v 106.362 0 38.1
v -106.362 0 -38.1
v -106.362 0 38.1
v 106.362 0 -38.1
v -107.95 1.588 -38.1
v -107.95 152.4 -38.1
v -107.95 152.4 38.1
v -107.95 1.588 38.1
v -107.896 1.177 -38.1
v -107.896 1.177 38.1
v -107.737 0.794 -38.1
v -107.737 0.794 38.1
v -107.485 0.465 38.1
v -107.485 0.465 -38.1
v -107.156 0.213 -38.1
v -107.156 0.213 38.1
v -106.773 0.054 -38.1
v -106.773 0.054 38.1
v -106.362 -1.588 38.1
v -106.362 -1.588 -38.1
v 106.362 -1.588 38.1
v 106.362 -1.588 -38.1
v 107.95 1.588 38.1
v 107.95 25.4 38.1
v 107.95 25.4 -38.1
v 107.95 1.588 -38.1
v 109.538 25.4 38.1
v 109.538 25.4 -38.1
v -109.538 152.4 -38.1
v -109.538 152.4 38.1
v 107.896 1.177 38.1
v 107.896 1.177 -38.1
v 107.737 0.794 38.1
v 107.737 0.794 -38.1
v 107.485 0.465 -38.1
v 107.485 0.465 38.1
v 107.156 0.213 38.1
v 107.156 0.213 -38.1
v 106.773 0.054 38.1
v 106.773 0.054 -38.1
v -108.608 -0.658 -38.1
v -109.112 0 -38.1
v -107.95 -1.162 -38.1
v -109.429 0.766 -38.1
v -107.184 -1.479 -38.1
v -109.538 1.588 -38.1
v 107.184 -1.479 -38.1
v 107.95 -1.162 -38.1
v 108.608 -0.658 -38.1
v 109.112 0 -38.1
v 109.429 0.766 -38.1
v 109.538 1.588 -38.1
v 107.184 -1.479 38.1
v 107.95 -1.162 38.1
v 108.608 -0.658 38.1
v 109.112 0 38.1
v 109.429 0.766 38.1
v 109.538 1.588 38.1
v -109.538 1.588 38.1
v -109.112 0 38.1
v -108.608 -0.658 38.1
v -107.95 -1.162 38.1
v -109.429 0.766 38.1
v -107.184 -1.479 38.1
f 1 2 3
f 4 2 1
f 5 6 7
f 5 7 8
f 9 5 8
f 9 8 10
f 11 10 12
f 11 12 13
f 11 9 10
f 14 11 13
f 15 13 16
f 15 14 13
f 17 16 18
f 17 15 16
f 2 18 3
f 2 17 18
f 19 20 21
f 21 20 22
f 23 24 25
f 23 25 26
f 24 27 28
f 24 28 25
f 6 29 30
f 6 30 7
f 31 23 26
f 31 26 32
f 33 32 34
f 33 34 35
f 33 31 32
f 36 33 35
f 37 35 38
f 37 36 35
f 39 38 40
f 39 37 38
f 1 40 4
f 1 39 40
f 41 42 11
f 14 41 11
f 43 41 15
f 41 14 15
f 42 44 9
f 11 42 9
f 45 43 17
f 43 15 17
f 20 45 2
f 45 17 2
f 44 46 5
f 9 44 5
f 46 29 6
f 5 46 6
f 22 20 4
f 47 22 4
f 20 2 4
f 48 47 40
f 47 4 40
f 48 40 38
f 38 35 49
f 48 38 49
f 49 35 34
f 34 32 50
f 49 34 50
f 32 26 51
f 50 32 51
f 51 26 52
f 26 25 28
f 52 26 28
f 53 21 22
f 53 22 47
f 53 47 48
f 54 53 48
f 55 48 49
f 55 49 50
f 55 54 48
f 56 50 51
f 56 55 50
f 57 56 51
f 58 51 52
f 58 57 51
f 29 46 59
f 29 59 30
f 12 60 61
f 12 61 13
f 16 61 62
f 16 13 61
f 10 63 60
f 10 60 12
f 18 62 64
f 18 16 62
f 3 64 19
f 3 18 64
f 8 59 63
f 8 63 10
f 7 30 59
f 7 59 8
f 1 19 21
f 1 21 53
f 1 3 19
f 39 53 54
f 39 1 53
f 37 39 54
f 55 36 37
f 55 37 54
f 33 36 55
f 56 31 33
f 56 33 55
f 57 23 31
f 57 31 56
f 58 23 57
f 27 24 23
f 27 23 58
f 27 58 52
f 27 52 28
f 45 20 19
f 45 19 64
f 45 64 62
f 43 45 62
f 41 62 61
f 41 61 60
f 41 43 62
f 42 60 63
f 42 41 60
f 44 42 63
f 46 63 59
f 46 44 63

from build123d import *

# Parameters (mm, degrees)
SKETCH1_W                    = 215.9
SKETCH1_H                    = 76.2
BASE_FLANGE1_DEPTH           = 1.5875
EDGE_FLANGE1_STRIP_W         = 9.525
EDGE_FLANGE1_STRIP_H         = 1.5875
EDGE_FLANGE1_STRIP_CUT_DEPTH = 76.2
EDGE_FLANGE1_DEPTH           = 76.2
EDGE_FLANGE3_STRIP_W         = 9.525
EDGE_FLANGE3_STRIP_H         = 1.5875
EDGE_FLANGE3_STRIP_CUT_DEPTH = 76.2
EDGE_FLANGE3_DEPTH           = 76.2


# Sheet-metal steps are written as plain solids
with BuildPart() as part:
    # Sketch1 → Base-Flange1 (new body)
    with BuildSketch(Plane(origin=(0, 0, 0), x_dir=(1, 0, 0), z_dir=(0, 1, 0))):
        Rectangle(SKETCH1_W, SKETCH1_H)
    extrude(amount=-BASE_FLANGE1_DEPTH)

    # Edge-Flange1 strip (across the edge) → Edge-Flange1 strip cut (cut)
    with BuildSketch(Plane(origin=(-107.95, 0, -38.1), x_dir=(1, 0, 0), z_dir=(0, 0, 1))):
        with Locations((-3.175, -0.79375)):
            Rectangle(EDGE_FLANGE1_STRIP_W, EDGE_FLANGE1_STRIP_H)
    extrude(amount=EDGE_FLANGE1_STRIP_CUT_DEPTH, mode=Mode.SUBTRACT)

    # Edge-Flange1 section (across the edge) → Edge-Flange1 (add)
    with BuildSketch(Plane(origin=(-107.95, 0, -38.1), x_dir=(1, 0, 0), z_dir=(0, 0, 1))):
        with BuildLine():
            Line((-1.5875, 1.5875), (-1.5875, 152.4))
            Line((-1.5875, 152.4), (0, 152.4))
            Line((0, 152.4), (0, 1.5875))
            ThreePointArc((0, 1.5875), (0.464967985, 0.464967985), (1.5875, 0))
            Line((1.5875, 0), (1.5875, -1.5875))
            ThreePointArc((1.5875, -1.5875), (-0.65756403, -0.65756403), (-1.5875, 1.5875))
        make_face()
    extrude(amount=EDGE_FLANGE1_DEPTH)

    # Edge-Flange3 strip (across the edge) → Edge-Flange3 strip cut (cut)
    with BuildSketch(Plane(origin=(107.95, 0, 38.1), x_dir=(-1, 0, 0), z_dir=(0, 0, -1))):
        with Locations((-3.175, -0.79375)):
            Rectangle(EDGE_FLANGE3_STRIP_W, EDGE_FLANGE3_STRIP_H)
    extrude(amount=EDGE_FLANGE3_STRIP_CUT_DEPTH, mode=Mode.SUBTRACT)

    # Edge-Flange3 section (across the edge) → Edge-Flange3 (add)
    with BuildSketch(Plane(origin=(107.95, 0, 38.1), x_dir=(-1, 0, 0), z_dir=(0, 0, -1))):
        with BuildLine():
            Line((-1.5875, 1.5875), (-1.5875, 25.4))
            Line((-1.5875, 25.4), (0, 25.4))
            Line((0, 25.4), (0, 1.5875))
            ThreePointArc((0, 1.5875), (0.464967985, 0.464967985), (1.5875, 0))
            Line((1.5875, 0), (1.5875, -1.5875))
            ThreePointArc((1.5875, -1.5875), (-0.65756403, -0.65756403), (-1.5875, 1.5875))
        make_face()
    extrude(amount=EDGE_FLANGE3_DEPTH)


solid = part.part
